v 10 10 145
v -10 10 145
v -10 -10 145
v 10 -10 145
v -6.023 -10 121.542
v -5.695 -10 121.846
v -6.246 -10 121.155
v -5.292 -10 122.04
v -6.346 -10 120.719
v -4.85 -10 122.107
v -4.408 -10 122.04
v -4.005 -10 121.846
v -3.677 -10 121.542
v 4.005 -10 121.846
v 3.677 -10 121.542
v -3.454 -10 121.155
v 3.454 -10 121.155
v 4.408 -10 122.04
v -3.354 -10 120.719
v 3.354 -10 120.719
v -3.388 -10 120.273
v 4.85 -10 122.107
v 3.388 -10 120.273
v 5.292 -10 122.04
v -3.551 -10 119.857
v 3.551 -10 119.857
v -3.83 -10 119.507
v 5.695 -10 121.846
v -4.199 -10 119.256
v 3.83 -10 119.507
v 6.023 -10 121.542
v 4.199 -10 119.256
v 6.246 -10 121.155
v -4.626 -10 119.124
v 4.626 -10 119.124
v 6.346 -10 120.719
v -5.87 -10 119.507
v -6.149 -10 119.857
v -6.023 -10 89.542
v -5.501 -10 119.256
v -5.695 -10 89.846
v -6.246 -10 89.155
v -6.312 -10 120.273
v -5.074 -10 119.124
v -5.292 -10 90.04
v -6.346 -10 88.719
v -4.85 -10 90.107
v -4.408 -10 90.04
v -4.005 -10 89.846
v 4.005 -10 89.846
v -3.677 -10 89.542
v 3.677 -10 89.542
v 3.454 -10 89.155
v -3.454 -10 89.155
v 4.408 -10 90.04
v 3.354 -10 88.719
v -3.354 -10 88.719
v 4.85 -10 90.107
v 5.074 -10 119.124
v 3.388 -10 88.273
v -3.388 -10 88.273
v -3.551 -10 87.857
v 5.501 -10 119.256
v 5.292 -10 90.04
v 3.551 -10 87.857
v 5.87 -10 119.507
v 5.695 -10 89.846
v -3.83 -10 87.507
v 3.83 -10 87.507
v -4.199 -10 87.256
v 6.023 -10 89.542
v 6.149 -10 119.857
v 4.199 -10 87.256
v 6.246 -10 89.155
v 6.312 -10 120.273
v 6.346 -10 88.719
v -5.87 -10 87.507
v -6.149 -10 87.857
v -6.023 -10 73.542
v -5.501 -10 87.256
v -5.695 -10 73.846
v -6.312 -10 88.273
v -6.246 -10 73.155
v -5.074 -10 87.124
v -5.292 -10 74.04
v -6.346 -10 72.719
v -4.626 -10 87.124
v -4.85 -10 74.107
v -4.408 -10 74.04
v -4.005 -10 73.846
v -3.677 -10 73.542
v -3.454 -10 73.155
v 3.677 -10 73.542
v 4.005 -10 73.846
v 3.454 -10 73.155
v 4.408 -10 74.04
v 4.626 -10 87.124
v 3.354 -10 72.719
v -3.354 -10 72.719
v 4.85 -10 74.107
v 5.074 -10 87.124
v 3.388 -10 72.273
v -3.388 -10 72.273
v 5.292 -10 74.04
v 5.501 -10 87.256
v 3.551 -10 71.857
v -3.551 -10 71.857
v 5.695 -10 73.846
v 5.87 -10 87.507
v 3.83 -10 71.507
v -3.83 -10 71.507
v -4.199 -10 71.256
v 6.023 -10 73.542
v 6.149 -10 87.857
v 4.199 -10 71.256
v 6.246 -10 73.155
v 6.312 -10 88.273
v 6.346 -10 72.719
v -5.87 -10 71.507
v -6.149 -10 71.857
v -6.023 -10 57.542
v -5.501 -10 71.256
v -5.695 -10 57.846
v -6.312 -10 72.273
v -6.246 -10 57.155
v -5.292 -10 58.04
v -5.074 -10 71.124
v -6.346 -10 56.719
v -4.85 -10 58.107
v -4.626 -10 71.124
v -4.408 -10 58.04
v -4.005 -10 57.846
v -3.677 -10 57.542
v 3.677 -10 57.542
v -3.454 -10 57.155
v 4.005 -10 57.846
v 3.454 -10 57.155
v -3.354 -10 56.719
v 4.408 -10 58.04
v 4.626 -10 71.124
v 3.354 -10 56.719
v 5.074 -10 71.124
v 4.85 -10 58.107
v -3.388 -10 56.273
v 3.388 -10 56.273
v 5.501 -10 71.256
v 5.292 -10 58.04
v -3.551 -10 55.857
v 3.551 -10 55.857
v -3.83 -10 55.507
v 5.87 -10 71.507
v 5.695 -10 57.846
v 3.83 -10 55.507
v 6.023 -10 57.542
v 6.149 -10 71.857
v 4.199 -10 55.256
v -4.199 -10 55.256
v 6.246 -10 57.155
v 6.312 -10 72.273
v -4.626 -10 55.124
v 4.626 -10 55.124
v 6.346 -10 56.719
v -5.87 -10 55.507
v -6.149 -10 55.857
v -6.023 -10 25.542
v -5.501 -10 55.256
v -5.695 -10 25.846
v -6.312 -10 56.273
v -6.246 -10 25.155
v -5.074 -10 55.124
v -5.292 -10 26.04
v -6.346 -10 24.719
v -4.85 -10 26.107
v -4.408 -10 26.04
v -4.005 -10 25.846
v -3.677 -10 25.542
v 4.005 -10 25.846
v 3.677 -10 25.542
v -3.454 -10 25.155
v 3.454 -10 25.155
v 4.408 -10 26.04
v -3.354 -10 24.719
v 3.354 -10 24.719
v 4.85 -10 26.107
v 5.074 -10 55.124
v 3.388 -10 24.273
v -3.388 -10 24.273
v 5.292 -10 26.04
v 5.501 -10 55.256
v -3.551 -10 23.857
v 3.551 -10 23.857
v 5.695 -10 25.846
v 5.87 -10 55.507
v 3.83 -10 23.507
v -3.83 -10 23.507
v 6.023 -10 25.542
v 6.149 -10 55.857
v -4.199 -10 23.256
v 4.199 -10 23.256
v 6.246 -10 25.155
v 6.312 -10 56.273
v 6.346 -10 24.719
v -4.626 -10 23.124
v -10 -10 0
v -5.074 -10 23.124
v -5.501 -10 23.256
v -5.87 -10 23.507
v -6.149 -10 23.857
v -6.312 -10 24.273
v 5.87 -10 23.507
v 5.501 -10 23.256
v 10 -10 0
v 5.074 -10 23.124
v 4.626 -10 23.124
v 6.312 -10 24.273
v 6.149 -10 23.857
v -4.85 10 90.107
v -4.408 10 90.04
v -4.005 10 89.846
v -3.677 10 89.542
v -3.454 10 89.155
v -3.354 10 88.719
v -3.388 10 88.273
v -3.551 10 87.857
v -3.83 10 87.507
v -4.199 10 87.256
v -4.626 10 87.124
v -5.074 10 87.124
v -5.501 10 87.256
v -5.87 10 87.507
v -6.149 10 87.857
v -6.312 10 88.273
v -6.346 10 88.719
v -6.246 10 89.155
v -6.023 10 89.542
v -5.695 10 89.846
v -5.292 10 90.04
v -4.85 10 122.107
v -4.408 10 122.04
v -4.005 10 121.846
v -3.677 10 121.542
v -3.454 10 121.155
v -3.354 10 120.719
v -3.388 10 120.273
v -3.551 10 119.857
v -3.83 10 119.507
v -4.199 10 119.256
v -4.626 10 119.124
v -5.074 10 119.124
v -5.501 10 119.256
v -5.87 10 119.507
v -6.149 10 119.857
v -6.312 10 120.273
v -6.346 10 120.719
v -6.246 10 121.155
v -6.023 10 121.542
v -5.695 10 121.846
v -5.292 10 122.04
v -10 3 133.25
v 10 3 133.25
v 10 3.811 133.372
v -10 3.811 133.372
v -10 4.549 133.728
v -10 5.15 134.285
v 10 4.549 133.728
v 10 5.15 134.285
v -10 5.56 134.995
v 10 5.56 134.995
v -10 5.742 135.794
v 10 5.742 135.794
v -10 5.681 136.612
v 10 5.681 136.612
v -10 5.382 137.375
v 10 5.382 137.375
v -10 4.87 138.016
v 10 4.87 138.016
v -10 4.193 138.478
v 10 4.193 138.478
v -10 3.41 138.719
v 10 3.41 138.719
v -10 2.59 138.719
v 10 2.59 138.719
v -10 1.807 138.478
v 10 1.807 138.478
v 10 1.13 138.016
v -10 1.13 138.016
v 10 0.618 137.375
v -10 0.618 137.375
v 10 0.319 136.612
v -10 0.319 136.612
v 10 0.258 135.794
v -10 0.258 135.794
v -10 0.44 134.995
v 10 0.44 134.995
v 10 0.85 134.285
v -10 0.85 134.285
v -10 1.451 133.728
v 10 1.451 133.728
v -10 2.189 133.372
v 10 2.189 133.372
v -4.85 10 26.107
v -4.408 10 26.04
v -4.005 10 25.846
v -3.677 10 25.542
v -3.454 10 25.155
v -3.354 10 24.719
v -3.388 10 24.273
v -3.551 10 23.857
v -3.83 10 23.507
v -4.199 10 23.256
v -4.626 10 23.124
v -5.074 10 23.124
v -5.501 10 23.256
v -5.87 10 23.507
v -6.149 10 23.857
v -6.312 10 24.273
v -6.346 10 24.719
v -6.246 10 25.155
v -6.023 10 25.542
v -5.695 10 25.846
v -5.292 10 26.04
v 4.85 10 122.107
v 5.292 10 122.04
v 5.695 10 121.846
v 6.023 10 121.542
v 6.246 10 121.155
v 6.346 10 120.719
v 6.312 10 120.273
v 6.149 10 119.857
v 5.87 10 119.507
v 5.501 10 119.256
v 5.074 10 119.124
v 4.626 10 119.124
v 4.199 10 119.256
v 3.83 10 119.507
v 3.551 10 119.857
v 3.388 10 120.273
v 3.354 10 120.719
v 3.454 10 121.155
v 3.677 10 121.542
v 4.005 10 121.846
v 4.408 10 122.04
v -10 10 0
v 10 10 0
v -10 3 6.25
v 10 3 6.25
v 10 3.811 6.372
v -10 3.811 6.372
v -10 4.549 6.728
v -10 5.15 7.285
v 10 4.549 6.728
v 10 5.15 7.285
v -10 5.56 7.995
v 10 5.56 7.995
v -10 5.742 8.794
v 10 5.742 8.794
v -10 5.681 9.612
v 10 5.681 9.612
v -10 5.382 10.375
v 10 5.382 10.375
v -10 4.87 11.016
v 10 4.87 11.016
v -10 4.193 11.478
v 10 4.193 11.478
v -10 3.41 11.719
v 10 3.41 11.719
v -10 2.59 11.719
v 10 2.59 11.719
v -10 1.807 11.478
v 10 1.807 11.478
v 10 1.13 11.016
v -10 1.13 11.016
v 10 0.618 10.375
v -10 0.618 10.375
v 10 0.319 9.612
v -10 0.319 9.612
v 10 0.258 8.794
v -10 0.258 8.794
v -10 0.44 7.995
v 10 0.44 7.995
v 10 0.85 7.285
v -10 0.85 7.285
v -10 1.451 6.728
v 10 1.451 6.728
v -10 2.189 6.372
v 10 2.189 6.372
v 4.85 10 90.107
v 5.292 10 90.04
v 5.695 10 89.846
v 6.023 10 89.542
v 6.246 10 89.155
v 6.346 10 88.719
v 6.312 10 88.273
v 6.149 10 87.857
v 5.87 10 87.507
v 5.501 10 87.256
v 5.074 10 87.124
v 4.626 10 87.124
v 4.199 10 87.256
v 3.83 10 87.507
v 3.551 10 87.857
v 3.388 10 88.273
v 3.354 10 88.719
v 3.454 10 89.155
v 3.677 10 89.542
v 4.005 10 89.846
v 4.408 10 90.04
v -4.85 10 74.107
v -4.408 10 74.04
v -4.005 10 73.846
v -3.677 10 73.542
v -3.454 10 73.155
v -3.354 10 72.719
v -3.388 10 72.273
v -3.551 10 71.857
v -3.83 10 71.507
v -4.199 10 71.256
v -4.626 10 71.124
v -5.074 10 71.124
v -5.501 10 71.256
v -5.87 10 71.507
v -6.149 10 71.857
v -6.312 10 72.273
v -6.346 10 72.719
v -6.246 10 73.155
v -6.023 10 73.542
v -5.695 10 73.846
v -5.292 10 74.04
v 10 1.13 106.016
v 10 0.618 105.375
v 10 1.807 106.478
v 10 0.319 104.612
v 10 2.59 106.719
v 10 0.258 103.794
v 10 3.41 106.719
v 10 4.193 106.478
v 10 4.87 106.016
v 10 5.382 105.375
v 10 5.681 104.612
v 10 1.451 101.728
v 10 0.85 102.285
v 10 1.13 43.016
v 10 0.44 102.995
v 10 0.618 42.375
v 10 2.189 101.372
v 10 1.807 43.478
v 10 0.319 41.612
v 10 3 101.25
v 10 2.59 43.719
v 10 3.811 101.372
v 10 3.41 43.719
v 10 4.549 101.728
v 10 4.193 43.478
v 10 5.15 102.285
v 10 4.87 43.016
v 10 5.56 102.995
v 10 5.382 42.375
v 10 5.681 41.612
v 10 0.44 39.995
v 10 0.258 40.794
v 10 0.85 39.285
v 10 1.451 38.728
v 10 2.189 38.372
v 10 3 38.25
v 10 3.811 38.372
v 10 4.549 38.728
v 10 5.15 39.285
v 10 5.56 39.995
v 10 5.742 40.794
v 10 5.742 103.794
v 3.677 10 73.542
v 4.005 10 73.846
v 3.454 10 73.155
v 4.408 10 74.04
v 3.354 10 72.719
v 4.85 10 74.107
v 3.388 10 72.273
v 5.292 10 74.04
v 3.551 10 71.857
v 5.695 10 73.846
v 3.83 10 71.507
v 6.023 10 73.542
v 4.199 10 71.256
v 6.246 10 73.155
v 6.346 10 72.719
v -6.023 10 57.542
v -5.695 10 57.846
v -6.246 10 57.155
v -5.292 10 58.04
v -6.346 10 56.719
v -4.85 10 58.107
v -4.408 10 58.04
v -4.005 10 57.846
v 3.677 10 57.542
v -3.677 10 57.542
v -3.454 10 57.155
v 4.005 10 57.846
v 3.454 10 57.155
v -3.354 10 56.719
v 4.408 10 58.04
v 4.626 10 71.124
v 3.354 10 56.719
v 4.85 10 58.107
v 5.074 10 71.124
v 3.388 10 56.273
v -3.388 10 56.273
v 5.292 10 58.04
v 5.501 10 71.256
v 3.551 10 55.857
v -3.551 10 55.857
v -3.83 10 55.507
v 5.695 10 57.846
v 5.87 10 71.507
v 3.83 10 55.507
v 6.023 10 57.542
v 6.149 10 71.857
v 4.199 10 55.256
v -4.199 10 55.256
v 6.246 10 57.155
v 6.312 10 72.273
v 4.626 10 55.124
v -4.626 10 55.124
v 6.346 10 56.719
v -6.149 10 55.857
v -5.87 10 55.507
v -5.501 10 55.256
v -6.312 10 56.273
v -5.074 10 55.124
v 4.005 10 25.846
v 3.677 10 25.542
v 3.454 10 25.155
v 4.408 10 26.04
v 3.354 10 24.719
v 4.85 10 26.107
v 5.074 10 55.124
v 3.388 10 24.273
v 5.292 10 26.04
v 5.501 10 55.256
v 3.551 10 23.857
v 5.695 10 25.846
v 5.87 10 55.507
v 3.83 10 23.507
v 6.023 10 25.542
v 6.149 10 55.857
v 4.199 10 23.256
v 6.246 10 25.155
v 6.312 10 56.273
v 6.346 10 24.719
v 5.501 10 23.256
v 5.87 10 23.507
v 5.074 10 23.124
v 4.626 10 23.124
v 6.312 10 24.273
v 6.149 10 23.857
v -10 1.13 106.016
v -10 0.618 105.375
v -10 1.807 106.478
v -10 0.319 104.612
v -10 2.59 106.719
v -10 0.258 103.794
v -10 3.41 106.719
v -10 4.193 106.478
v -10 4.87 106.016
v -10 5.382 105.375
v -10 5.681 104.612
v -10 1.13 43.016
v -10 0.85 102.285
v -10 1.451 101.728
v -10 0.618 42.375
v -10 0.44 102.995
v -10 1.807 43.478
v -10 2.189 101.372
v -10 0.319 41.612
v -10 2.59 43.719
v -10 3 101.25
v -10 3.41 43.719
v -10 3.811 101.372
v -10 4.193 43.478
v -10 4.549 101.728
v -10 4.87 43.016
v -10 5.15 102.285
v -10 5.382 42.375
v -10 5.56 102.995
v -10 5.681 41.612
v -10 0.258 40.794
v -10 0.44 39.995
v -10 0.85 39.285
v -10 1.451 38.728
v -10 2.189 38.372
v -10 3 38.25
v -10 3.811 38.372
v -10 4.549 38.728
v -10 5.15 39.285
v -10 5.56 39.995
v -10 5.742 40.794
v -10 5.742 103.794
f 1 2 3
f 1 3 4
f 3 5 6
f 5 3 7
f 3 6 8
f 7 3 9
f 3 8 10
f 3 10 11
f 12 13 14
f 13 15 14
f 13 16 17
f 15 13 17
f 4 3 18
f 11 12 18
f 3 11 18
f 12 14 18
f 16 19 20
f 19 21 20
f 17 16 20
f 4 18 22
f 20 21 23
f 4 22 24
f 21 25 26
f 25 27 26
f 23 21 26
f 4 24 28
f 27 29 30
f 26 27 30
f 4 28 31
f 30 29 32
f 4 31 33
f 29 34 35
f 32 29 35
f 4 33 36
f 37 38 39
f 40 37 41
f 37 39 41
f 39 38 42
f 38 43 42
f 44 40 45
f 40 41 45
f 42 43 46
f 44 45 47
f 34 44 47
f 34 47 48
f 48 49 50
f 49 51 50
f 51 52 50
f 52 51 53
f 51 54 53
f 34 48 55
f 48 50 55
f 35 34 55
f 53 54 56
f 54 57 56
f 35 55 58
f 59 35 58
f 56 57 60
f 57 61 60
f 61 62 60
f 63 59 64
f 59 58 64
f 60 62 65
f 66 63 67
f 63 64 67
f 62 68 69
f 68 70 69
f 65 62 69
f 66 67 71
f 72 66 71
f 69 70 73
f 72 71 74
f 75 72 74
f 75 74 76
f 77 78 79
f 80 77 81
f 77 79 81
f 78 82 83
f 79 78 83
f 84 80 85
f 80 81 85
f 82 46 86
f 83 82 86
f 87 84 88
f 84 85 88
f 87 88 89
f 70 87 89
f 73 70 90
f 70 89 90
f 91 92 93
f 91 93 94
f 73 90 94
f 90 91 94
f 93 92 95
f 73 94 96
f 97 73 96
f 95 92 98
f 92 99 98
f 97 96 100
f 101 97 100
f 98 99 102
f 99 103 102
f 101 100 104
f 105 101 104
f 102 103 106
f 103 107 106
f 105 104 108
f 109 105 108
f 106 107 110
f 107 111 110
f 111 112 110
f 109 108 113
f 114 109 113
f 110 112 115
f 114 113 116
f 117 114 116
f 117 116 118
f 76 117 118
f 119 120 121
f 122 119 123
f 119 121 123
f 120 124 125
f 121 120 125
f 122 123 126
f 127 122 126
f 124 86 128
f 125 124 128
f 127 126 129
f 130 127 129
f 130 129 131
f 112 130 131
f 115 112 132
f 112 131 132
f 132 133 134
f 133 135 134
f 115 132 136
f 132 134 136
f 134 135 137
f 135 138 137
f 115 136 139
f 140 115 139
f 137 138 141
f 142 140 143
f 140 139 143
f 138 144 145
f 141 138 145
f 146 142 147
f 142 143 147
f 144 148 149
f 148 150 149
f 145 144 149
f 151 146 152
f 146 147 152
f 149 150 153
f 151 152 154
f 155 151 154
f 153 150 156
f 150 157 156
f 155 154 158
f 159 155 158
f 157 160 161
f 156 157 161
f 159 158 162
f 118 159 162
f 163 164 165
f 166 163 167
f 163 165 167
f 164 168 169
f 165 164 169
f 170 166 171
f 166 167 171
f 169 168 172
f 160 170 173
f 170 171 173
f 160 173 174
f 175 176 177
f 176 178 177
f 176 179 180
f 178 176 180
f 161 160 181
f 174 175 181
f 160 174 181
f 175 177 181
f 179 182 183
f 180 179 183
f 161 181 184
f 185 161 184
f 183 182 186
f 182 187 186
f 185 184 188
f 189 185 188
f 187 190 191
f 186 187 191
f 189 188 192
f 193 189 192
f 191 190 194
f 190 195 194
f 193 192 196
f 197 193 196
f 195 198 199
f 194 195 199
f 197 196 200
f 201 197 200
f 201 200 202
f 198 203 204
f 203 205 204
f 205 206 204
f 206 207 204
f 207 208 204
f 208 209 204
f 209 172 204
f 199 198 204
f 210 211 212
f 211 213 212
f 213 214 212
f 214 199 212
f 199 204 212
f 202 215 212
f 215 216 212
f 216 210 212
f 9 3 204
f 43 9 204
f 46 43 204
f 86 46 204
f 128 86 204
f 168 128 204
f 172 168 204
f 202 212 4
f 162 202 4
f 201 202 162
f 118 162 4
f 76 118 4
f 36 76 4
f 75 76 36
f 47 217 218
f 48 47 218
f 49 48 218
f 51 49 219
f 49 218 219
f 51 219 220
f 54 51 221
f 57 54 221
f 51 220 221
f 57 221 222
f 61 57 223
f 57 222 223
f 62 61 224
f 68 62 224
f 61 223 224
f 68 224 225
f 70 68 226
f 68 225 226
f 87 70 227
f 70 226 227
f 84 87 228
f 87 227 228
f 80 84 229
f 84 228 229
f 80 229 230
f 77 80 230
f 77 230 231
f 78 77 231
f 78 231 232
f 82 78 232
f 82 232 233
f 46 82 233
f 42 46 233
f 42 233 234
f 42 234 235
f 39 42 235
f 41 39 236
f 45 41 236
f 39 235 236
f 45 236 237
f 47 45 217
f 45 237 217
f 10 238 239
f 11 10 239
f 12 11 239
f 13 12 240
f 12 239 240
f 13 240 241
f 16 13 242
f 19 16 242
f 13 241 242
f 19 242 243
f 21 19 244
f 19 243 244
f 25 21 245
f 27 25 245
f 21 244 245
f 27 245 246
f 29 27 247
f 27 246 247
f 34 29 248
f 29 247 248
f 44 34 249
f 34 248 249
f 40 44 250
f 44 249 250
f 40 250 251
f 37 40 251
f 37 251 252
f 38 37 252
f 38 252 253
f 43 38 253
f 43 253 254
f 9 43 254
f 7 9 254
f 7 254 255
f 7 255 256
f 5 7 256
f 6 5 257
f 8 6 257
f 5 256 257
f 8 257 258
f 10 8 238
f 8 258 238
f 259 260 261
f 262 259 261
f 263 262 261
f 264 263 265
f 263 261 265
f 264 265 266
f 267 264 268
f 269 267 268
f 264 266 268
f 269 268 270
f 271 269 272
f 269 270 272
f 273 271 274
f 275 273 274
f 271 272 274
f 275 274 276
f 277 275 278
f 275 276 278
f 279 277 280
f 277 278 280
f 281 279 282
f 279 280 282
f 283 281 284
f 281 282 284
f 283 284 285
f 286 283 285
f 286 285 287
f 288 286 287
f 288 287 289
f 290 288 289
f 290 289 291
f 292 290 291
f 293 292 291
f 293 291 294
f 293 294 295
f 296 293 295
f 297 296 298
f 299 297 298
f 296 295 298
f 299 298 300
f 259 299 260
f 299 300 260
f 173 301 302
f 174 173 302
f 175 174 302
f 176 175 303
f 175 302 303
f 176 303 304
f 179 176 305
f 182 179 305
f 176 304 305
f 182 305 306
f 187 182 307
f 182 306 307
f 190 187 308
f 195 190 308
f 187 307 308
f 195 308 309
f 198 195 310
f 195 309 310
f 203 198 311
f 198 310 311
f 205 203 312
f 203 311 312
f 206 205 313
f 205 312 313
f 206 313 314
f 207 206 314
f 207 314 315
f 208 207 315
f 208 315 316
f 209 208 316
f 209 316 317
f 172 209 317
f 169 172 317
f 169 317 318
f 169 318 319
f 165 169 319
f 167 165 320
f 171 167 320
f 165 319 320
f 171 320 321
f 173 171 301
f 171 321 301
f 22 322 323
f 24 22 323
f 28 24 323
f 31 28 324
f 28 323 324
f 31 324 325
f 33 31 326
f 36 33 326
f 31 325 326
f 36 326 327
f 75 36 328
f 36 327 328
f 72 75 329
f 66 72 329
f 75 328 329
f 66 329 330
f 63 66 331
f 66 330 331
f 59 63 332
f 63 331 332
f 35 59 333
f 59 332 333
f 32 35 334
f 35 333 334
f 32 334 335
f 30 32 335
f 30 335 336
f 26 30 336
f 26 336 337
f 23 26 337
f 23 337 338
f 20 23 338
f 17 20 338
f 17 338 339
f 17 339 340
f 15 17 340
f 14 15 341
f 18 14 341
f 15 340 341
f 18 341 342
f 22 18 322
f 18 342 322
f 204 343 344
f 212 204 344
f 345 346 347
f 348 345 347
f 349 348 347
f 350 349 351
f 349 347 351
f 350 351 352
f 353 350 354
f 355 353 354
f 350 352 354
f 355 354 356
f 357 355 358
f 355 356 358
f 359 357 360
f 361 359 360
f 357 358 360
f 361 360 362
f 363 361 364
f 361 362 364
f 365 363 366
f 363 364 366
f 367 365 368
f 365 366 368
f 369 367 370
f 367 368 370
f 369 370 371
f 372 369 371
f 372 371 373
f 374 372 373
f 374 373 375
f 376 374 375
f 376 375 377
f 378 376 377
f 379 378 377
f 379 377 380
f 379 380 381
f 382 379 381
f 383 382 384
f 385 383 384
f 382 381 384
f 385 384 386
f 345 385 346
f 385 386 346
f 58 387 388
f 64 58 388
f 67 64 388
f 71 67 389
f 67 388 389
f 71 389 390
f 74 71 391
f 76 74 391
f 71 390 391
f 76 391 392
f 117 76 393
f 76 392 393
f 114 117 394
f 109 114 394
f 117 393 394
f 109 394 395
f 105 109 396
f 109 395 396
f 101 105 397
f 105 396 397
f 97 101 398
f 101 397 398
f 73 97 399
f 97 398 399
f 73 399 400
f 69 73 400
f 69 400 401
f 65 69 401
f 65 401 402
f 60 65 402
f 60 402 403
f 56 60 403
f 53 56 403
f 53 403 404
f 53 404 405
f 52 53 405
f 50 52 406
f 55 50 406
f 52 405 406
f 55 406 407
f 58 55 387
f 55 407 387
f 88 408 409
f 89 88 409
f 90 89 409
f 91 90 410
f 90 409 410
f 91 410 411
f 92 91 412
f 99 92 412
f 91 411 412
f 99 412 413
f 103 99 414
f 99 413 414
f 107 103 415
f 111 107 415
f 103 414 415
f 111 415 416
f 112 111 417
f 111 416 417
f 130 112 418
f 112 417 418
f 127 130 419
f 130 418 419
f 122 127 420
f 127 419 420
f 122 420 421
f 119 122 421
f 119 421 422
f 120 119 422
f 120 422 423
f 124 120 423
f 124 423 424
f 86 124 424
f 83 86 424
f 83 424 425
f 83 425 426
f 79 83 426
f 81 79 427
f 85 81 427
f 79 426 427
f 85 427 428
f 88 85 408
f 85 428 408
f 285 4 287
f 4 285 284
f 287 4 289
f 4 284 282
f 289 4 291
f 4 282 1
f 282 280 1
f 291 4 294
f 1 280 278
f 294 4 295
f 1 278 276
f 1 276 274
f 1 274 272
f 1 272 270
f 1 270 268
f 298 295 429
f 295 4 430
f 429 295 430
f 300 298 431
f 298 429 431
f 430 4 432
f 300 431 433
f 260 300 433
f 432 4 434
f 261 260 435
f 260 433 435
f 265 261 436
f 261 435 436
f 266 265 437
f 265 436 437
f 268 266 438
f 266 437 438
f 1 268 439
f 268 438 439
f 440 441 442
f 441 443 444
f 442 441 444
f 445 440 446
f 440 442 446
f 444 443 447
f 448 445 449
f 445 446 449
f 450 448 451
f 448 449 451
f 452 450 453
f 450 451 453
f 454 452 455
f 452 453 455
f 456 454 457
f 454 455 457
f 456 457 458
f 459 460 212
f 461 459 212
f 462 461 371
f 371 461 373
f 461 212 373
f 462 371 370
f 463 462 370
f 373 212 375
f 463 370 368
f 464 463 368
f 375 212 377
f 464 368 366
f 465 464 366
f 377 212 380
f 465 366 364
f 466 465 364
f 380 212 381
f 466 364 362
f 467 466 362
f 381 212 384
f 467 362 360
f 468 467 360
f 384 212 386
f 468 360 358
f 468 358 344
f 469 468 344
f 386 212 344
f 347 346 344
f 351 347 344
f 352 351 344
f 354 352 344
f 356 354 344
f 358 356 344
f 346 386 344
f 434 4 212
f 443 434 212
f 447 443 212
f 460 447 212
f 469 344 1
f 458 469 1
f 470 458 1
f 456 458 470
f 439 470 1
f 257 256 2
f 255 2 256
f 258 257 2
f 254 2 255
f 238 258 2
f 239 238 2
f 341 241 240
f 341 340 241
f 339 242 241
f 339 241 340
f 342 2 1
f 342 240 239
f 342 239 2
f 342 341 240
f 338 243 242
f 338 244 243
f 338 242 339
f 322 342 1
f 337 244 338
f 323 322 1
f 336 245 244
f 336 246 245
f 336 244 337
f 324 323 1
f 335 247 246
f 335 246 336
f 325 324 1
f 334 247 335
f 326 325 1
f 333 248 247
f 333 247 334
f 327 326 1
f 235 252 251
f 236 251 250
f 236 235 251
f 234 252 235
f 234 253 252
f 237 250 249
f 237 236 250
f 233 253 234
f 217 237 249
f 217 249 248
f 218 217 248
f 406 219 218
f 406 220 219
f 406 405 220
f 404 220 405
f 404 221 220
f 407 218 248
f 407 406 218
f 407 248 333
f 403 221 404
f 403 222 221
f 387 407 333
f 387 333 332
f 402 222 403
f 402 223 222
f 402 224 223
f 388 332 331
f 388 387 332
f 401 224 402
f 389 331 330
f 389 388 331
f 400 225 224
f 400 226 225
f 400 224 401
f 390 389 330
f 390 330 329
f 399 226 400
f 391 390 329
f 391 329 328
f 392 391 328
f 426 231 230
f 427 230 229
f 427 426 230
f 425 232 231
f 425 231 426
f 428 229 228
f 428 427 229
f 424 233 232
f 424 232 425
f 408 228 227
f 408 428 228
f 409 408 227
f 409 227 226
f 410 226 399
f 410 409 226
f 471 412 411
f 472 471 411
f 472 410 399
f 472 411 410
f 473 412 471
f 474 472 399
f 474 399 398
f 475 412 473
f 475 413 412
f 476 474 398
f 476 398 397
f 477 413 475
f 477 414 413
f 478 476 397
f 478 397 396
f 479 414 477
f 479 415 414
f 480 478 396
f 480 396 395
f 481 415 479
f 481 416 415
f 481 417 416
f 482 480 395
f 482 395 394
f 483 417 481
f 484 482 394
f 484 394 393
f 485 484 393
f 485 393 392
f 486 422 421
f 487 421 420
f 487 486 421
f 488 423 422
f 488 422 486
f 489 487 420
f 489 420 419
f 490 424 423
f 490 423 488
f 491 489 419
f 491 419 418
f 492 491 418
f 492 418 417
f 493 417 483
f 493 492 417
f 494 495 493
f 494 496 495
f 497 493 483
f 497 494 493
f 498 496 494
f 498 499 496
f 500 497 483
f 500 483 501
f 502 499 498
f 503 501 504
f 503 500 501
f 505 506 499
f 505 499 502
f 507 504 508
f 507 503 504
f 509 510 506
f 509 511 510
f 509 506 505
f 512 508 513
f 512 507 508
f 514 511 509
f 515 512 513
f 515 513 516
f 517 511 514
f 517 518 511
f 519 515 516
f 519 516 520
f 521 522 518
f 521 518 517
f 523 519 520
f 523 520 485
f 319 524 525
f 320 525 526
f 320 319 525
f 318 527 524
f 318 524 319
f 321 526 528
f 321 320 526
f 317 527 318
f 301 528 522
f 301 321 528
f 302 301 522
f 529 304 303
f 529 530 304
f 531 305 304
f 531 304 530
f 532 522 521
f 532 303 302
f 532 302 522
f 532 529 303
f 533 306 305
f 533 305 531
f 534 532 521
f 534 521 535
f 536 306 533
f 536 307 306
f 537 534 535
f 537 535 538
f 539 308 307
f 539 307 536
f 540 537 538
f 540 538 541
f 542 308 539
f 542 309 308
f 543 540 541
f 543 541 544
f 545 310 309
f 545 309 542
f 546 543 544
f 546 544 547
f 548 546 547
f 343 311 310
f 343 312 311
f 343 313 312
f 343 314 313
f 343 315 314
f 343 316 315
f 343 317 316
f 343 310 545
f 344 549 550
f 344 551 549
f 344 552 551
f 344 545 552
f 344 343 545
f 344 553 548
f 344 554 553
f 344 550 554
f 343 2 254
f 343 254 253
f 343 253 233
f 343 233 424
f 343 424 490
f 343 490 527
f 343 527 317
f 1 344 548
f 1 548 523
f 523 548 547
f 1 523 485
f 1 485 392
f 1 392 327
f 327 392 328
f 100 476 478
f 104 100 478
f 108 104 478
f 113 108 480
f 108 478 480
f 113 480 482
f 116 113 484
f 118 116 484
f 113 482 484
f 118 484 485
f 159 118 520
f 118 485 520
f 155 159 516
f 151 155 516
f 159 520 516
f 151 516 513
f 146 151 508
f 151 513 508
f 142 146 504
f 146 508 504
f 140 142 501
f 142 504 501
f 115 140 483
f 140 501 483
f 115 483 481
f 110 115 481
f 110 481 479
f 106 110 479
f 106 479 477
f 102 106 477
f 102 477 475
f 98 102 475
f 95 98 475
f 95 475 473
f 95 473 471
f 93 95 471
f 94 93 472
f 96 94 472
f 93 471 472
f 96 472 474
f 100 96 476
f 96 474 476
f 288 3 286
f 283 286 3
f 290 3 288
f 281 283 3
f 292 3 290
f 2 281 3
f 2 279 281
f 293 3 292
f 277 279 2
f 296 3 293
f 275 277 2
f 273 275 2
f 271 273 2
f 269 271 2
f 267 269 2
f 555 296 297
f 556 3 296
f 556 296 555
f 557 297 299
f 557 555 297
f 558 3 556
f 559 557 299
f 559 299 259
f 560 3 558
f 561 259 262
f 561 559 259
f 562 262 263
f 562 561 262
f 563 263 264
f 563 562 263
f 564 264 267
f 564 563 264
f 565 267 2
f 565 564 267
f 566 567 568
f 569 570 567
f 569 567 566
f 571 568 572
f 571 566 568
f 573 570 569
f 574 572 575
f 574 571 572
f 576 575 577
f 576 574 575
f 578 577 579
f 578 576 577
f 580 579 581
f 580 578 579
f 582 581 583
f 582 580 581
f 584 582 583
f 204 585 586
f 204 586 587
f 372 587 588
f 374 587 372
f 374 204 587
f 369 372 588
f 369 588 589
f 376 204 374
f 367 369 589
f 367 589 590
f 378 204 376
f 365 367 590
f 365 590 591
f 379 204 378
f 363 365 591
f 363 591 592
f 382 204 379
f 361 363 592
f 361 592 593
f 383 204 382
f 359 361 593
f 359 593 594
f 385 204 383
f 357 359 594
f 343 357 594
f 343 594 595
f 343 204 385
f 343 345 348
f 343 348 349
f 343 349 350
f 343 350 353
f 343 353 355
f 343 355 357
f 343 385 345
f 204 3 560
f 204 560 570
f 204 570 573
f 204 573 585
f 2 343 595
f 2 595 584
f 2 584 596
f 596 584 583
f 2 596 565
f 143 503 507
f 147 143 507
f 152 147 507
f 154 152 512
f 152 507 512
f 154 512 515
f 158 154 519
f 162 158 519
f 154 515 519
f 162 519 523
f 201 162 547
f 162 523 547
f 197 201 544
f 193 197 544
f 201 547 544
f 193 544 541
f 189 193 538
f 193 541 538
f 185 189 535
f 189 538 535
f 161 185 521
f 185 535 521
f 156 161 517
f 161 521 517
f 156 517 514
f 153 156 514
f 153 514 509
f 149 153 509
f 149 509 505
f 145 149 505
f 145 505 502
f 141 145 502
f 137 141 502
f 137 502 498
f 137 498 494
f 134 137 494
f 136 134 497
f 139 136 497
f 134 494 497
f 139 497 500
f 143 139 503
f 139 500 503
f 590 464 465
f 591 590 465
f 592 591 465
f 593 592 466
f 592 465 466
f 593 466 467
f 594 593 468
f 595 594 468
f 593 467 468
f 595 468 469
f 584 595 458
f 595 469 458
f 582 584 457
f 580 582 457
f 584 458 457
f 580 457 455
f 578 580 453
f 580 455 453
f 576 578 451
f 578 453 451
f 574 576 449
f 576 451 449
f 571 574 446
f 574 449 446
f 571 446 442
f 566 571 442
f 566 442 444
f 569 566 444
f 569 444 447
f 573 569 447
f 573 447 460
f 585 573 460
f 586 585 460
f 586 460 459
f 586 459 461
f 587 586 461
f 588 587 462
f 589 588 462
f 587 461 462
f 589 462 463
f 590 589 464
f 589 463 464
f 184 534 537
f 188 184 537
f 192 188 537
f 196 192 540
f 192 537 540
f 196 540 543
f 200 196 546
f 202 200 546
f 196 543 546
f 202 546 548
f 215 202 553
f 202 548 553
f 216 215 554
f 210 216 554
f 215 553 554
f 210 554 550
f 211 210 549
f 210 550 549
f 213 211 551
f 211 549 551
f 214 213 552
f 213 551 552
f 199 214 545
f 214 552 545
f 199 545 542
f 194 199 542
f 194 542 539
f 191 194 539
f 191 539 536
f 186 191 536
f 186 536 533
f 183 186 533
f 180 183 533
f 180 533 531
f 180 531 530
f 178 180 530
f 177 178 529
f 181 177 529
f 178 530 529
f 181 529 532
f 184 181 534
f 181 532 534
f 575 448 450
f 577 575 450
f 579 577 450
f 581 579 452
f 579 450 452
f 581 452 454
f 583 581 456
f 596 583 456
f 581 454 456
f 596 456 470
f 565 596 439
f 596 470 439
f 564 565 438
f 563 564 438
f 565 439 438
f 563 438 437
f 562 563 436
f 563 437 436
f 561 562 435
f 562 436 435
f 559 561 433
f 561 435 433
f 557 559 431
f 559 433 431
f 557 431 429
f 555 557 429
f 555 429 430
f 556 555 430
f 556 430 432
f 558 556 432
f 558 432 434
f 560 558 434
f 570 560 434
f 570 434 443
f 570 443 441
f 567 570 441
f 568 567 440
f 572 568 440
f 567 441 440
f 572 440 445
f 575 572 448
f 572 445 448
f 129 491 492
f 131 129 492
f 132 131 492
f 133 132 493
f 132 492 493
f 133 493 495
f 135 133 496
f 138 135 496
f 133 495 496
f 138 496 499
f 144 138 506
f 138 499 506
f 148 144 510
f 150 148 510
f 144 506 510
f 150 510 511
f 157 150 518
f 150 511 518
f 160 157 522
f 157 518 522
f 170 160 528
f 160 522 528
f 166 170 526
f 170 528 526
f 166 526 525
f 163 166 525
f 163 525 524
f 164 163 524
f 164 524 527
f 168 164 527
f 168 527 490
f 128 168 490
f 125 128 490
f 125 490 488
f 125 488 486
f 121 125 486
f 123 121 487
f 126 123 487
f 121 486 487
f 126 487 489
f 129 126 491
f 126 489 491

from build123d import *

# Parameters (mm, degrees)
SKETCH_1_W          = 20
SKETCH_1_H          = 20
EXTRUDE_1_DEPTH     = 145
SKETCH_2_R          = 2.75
CUT_EXTRUDE_1_DEPTH = 20
SKETCH_4_R          = 1.5
CUT_EXTRUDE_4_DEPTH = 20


with BuildPart() as part:
    # 草图1 → 凸台-拉伸1 (new body)
    with BuildSketch(Plane.XY):
        Rectangle(SKETCH_1_W, SKETCH_1_H)
    extrude(amount=EXTRUDE_1_DEPTH)

    # 草图2 → 切除-拉伸1 (cut)
    with BuildSketch(Plane(origin=(10, 0, 0), x_dir=(0, 0, -1), z_dir=(1, 0, 0))):
        with Locations((-136, 3)):
            Circle(SKETCH_2_R)
        with Locations((-104, 3)):
            Circle(SKETCH_2_R)
        with Locations((-9, 3)):
            Circle(SKETCH_2_R)
        with Locations((-41, 3)):
            Circle(SKETCH_2_R)
    extrude(amount=-CUT_EXTRUDE_1_DEPTH, mode=Mode.SUBTRACT)

    # 草图4 → 切除-拉伸4 (cut)
    with BuildSketch(Plane(origin=(0, 10, 0), x_dir=(1, 0, 0), z_dir=(0, 1, 0))):
        with Locations(Location((-4.85, -24.606973042, 0), (0, 0, 270))):
            Circle(SKETCH_4_R)
        with Locations(Location((-4.85, -56.606973042, 0), (0, 0, 270))):
            Circle(SKETCH_4_R)
        with Locations(Location((-4.85, -72.606973042, 0), (0, 0, 270))):
            Circle(SKETCH_4_R)
        with Locations(Location((-4.85, -88.606973042, 0), (0, 0, 270))):
            Circle(SKETCH_4_R)
        with Locations(Location((-4.85, -120.606973042, 0), (0, 0, 270))):
            Circle(SKETCH_4_R)
        with Locations(Location((4.85, -120.606973042, 0), (0, 0, 270))):
            Circle(SKETCH_4_R)
        with Locations(Location((4.85, -88.606973042, 0), (0, 0, 270))):
            Circle(SKETCH_4_R)
        with Locations(Location((4.85, -72.606973042, 0), (0, 0, 270))):
            Circle(SKETCH_4_R)
        with Locations(Location((4.85, -56.606973042, 0), (0, 0, 270))):
            Circle(SKETCH_4_R)
        with Locations(Location((4.85, -24.606973042, 0), (0, 0, 270))):
            Circle(SKETCH_4_R)
    extrude(amount=-CUT_EXTRUDE_4_DEPTH, mode=Mode.SUBTRACT)


solid = part.part
